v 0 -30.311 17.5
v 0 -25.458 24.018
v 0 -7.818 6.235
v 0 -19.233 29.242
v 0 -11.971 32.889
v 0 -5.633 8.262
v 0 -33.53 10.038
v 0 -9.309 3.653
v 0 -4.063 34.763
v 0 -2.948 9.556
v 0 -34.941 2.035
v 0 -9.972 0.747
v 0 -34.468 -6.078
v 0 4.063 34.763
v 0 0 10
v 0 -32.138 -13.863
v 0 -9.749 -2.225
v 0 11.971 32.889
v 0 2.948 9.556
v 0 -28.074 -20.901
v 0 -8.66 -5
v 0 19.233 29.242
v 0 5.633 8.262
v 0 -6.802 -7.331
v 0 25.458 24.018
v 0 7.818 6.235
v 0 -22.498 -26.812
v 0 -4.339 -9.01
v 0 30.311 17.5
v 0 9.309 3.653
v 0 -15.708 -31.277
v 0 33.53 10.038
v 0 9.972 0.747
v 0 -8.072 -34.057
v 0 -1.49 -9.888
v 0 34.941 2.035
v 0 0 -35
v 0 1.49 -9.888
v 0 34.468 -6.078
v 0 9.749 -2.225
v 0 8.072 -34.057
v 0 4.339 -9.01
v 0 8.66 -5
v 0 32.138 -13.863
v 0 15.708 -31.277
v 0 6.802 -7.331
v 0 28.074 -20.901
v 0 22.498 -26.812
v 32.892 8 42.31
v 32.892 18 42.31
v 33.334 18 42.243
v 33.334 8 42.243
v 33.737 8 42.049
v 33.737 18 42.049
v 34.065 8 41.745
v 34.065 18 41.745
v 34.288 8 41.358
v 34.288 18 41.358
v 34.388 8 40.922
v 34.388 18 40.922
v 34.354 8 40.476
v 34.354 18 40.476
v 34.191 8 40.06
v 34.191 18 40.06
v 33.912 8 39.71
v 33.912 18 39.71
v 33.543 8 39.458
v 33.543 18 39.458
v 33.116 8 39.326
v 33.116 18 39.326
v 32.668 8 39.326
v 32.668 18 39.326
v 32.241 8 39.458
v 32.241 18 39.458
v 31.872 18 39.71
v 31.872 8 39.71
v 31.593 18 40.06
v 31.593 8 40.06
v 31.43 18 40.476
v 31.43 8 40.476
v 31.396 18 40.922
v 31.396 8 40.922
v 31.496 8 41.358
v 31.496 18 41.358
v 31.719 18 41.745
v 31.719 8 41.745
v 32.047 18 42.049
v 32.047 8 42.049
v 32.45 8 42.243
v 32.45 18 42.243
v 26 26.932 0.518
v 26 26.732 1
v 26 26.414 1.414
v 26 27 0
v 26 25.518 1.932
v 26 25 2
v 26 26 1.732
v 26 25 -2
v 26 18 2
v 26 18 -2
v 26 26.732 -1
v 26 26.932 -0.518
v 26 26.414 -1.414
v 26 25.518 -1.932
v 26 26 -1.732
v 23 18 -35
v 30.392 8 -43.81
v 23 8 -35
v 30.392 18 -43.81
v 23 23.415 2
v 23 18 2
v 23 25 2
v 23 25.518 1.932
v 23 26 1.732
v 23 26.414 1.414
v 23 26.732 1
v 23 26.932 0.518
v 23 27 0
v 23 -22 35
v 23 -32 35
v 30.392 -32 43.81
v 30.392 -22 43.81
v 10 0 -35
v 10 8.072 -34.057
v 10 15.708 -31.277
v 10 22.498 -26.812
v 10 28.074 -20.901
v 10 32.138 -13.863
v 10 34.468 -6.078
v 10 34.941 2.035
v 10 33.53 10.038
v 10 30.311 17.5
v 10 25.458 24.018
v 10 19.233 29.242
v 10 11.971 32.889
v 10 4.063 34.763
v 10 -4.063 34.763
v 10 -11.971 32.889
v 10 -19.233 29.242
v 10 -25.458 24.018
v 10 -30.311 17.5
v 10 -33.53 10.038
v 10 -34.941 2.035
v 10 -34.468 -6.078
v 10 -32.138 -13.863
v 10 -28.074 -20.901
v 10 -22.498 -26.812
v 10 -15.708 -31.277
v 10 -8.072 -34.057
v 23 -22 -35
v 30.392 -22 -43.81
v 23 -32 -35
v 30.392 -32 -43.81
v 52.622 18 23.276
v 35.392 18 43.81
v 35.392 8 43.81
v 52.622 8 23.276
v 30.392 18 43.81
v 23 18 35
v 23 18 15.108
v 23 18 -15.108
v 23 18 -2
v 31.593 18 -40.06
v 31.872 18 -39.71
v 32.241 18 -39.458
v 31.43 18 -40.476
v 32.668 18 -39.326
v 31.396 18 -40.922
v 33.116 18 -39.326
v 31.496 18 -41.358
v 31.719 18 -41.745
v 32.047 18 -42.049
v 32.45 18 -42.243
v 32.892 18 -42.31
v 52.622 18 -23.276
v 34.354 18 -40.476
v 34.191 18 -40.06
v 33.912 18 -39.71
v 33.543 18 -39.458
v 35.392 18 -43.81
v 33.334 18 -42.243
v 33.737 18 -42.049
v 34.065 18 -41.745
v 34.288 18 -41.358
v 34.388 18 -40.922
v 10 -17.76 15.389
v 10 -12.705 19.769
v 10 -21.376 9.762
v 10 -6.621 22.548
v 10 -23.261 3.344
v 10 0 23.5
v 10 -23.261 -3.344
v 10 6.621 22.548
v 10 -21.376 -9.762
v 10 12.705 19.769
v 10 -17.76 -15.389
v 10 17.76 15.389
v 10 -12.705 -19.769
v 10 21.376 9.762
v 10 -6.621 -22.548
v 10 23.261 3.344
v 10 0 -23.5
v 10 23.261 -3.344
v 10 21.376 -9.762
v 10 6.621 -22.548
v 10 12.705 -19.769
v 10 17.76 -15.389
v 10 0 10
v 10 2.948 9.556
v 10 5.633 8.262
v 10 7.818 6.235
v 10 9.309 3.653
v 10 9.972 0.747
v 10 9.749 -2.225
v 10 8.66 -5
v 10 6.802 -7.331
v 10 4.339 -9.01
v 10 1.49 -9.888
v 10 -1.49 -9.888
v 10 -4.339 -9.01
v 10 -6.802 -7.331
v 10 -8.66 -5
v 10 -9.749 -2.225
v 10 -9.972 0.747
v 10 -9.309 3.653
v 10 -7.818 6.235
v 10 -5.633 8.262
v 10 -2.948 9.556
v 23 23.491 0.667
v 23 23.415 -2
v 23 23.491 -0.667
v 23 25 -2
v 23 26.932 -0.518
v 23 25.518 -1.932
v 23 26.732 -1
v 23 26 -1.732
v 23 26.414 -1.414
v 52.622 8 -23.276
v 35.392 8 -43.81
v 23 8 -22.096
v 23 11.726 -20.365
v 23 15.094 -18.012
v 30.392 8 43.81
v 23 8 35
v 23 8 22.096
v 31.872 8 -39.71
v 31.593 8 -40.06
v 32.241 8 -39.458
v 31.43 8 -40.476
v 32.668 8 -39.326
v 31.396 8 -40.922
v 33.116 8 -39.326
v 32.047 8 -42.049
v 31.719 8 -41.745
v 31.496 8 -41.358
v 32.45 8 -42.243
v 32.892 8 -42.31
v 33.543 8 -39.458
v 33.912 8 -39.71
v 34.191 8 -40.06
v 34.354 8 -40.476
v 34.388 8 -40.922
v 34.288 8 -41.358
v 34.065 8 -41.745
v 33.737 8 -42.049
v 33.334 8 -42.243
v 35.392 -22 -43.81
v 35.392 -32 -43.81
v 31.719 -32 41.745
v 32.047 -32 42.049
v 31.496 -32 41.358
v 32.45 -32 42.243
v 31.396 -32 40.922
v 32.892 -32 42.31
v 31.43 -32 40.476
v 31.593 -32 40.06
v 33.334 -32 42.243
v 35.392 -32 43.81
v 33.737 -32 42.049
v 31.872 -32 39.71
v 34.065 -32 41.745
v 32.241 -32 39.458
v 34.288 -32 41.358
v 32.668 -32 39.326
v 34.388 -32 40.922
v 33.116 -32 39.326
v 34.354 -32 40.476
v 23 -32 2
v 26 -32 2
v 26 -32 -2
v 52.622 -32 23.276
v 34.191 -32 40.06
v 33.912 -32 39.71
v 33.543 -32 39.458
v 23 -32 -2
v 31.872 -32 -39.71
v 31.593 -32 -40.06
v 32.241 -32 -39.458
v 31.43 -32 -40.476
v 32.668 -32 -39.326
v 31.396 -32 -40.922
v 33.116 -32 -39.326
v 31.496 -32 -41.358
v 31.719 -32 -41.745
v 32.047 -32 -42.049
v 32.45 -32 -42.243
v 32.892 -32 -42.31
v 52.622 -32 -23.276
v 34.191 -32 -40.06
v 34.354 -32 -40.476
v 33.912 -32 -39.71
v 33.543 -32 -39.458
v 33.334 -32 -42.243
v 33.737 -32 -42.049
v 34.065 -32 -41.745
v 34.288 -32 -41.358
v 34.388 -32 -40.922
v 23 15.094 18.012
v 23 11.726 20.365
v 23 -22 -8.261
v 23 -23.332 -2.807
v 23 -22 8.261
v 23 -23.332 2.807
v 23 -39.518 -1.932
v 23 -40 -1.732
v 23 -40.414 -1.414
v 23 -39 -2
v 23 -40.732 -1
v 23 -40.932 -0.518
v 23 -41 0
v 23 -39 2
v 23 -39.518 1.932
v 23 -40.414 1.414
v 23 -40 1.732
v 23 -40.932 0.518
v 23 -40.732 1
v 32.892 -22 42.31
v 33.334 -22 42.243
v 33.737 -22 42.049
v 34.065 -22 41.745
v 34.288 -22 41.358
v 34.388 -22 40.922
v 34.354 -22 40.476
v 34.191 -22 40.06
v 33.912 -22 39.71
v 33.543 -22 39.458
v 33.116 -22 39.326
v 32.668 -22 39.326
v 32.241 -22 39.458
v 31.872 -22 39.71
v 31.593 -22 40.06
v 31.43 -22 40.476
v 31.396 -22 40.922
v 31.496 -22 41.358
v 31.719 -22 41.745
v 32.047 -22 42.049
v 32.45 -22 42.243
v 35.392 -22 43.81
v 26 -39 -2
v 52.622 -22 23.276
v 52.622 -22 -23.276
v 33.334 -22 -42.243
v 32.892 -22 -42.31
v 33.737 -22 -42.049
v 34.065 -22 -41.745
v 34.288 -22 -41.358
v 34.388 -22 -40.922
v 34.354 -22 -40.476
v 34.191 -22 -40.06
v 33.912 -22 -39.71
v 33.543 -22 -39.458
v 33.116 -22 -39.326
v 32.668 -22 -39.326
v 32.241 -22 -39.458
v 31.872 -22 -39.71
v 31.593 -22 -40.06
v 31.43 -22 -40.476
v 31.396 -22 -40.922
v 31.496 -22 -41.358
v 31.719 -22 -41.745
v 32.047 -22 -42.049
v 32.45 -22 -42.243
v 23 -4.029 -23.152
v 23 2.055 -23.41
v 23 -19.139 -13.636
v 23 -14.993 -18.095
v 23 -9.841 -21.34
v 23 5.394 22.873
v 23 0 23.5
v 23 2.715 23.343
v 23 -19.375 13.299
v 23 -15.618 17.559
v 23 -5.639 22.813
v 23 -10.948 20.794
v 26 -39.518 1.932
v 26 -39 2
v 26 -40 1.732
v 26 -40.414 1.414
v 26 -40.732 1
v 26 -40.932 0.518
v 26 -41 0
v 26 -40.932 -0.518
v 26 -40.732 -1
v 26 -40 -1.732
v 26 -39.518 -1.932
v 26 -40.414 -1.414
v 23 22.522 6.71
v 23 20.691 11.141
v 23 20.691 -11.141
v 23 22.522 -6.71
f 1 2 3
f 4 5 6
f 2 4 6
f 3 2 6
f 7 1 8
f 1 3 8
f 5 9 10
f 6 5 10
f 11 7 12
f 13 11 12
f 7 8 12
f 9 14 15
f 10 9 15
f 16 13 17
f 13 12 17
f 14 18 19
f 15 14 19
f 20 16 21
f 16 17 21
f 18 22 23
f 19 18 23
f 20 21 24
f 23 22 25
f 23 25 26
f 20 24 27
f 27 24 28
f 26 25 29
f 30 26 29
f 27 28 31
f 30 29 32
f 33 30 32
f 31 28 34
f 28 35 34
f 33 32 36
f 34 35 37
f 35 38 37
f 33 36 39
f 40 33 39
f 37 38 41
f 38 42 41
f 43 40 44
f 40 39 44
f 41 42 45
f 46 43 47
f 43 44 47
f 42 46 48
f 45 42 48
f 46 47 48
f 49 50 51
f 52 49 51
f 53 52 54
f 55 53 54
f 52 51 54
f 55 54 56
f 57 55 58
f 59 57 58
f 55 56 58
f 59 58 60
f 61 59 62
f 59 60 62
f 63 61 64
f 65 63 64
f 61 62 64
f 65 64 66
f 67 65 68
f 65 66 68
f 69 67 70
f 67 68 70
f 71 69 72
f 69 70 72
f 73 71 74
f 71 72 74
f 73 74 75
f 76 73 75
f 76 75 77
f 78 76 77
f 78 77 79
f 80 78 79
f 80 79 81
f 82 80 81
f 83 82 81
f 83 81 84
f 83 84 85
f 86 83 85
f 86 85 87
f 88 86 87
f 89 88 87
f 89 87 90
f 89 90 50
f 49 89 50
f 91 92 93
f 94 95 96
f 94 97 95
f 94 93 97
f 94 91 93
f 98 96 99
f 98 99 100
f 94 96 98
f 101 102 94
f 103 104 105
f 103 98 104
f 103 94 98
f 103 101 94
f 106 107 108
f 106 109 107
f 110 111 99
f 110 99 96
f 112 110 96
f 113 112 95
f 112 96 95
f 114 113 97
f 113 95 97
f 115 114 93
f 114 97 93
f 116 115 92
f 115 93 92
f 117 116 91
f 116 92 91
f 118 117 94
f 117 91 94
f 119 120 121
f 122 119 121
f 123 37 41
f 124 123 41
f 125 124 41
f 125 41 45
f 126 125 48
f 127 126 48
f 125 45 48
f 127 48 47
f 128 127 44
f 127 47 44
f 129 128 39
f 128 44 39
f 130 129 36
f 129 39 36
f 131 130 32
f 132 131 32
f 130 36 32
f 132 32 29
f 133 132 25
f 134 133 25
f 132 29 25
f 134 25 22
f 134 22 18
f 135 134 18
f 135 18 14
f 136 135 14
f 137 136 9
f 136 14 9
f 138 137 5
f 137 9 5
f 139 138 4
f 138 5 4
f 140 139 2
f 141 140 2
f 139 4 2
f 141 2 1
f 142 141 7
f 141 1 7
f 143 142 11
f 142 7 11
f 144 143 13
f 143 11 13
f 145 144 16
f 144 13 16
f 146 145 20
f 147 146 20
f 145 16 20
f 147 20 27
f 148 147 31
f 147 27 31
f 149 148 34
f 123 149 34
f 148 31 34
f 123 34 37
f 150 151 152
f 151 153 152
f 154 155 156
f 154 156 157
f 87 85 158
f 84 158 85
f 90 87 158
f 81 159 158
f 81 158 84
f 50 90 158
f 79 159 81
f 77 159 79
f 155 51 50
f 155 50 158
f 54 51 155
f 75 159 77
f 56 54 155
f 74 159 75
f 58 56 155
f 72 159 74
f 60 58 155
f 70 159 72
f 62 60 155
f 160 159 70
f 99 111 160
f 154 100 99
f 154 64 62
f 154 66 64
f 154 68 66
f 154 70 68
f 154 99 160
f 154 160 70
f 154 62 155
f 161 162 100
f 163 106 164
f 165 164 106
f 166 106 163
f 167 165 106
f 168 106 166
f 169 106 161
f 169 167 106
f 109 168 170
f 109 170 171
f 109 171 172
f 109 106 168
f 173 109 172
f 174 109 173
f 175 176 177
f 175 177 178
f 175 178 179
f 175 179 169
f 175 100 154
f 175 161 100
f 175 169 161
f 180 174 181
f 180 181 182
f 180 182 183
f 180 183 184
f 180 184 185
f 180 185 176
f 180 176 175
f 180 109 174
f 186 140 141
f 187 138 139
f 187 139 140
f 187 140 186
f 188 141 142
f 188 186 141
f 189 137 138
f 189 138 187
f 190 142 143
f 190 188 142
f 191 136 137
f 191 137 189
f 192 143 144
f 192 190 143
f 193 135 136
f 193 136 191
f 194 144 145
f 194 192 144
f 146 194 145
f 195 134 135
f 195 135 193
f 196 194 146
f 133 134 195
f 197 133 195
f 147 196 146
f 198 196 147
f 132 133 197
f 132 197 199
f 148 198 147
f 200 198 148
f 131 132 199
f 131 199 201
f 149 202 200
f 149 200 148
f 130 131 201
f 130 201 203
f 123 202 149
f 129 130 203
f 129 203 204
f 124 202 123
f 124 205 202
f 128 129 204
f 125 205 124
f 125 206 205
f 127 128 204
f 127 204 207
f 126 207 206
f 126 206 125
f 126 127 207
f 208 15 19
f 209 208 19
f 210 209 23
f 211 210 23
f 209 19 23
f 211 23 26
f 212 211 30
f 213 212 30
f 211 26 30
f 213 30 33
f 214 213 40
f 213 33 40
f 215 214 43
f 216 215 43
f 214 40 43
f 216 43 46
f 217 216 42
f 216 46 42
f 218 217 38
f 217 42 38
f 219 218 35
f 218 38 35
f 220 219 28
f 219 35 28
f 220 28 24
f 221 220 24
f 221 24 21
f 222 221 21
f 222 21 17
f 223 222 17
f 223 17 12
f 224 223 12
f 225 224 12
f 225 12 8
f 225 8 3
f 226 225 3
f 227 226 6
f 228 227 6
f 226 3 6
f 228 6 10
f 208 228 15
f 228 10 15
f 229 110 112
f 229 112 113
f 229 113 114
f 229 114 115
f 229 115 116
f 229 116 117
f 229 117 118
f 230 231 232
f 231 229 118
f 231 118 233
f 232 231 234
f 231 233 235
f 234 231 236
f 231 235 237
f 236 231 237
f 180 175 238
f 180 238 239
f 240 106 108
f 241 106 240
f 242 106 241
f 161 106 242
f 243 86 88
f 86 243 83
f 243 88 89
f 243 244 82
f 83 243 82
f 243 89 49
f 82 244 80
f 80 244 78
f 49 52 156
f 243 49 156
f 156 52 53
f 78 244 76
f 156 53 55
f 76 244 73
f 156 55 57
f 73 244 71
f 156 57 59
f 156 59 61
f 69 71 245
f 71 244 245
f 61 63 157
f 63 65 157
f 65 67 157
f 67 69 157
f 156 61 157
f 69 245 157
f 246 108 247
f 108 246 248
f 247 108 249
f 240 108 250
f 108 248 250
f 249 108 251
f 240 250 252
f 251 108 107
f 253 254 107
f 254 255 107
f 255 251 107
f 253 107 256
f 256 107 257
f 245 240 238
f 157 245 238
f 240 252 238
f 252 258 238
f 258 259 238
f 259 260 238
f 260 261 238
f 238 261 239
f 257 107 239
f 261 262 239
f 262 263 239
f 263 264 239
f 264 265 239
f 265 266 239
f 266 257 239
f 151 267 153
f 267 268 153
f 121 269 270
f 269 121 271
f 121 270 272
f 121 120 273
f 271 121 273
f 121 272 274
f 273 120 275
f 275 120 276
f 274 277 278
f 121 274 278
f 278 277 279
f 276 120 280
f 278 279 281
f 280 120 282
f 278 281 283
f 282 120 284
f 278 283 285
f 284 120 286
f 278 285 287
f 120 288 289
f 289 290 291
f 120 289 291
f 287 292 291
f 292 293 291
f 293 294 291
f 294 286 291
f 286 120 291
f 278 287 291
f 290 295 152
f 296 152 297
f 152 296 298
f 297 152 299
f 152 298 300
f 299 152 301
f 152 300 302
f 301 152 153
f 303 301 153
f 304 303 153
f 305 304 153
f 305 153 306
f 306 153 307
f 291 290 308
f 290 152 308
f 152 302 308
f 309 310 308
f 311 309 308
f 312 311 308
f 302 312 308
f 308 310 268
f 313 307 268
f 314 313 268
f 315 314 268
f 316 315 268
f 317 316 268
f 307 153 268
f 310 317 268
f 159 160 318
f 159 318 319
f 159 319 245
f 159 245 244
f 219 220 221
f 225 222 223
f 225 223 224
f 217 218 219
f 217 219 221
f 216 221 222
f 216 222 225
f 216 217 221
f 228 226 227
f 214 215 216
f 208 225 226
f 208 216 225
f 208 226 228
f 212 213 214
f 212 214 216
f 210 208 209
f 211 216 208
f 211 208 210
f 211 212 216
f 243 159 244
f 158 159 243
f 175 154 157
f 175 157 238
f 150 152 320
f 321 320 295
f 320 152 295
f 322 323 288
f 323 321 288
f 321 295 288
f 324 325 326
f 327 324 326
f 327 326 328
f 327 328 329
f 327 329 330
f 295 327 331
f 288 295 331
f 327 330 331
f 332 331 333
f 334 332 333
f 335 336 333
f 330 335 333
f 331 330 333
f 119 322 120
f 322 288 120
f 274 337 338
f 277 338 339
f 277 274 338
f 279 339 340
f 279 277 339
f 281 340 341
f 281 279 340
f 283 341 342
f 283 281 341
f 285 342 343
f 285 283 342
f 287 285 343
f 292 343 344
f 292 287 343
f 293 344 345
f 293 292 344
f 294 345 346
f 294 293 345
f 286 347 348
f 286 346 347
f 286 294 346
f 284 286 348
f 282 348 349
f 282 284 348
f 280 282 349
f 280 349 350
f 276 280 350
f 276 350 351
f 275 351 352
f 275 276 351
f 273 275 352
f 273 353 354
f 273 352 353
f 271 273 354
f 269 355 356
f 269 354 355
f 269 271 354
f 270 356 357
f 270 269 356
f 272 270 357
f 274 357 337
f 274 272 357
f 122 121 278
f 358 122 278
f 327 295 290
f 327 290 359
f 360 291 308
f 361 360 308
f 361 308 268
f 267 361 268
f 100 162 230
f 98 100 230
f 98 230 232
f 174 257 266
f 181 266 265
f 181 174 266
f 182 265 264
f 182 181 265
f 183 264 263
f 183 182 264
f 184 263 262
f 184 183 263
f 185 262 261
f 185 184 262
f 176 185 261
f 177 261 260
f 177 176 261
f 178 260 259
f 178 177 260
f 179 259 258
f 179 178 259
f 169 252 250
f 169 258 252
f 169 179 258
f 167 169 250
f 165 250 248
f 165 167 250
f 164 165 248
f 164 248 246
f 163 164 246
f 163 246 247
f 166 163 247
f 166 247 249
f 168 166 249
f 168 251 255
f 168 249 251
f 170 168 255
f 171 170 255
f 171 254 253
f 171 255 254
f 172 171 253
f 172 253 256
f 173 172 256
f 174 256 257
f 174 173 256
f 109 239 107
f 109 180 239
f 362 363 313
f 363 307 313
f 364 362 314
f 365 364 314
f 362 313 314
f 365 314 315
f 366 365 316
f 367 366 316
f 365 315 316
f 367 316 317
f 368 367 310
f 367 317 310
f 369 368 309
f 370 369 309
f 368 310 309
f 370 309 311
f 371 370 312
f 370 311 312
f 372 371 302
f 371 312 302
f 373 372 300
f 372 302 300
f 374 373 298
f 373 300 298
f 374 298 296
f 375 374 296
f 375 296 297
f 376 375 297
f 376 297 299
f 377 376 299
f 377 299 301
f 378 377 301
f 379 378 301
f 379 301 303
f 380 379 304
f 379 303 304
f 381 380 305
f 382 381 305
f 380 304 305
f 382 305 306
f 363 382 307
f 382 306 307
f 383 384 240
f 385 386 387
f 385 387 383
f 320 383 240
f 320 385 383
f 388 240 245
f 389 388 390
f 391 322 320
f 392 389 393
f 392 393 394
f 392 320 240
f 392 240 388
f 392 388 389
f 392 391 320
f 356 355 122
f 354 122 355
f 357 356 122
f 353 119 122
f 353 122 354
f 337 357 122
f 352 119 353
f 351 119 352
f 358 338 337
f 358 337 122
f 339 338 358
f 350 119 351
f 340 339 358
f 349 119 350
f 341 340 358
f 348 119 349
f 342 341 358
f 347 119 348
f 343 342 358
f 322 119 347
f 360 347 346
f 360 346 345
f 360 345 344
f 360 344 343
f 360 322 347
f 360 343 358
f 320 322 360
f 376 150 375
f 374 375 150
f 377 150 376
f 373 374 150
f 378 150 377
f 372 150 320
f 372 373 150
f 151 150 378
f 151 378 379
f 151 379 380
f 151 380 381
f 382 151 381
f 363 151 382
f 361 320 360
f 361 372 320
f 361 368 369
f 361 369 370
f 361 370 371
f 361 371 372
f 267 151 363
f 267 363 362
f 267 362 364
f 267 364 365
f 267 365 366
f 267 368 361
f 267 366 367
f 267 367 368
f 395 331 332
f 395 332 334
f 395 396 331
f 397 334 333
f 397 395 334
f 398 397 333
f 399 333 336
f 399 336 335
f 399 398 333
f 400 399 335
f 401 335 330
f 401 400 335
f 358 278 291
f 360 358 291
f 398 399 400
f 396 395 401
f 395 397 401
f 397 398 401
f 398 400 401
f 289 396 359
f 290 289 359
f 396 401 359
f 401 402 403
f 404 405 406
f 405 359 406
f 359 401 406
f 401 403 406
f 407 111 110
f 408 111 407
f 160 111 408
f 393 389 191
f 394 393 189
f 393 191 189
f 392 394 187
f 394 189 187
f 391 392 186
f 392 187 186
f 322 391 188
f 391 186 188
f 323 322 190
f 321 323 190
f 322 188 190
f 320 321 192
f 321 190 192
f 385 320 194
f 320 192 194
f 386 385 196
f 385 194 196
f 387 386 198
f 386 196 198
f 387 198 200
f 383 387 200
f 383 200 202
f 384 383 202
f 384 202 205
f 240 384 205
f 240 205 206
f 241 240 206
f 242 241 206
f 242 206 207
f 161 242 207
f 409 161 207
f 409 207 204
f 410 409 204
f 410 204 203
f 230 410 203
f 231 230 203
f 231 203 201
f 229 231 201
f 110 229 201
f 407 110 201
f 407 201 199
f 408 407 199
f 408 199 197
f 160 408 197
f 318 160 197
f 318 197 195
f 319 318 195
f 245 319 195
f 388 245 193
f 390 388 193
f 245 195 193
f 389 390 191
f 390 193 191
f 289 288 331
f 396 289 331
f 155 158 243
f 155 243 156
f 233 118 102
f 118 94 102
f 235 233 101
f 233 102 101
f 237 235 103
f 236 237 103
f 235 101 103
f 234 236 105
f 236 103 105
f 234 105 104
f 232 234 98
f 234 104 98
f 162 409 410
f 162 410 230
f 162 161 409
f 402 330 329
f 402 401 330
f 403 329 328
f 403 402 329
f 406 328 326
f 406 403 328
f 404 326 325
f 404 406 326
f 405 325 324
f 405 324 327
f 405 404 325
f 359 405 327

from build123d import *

# Parameters (mm, degrees)
SKETCH1_R               = 35
BOSS_EXTRUDE1_DEPTH     = 10
SKETCH2_R               = 23.5
BOSS_EXTRUDE2_DEPTH     = 13
BOSS_EXTRUDE3_DEPTH     = 5
SKETCH5_R               = 1.5
CUT_EXTRUDE1_DEPTH      = 87.587143002
SKETCH9_W               = 4
SKETCH9_H               = 9
BOSS_EXTRUDE8_DEPTH     = 3
FILLET3_R               = 2
SKETCH11_R              = 10
CUT_EXTRUDE2_DEPTH      = 10
MIRROR2_COPY_1_SKETCH_R = 1.5
MIRROR2_COPY_1_DEPTH    = 87.587143002
FILLET3_OF_MIRROR2_R    = 2


with BuildPart() as part:
    # Sketch1 → Boss-Extrude1 (new body)
    with BuildSketch(Plane(origin=(0, 0, 0), x_dir=(0, 0, -1), z_dir=(1, 0, 0))):
        Circle(SKETCH1_R)
    extrude(amount=BOSS_EXTRUDE1_DEPTH)

    # Sketch2 → Boss-Extrude2 (add)
    with BuildSketch(Plane(origin=(10, 0, 0), x_dir=(0, 0, -1), z_dir=(1, 0, 0))):
        with Locations(Location((0, 0, 0), (0, 0, 180))):
            Circle(SKETCH2_R)
    extrude(amount=BOSS_EXTRUDE2_DEPTH)

    # Sketch4 → Boss-Extrude3 (add, symmetric)
    with BuildSketch(Plane(origin=(0, 13, 0), x_dir=(1, 0, 0), z_dir=(0, 1, 0))):
        Polygon((23, 35), (23, -35), (30.392057511, -43.809511096), (35.392057511, -43.809511096), (52.621859248, -23.275832977), (52.621859248, 23.275832977), (35.392057511, 43.809511096), (30.392057511, 43.809511096), align=None)
    boss_extrude3 = extrude(amount=BOSS_EXTRUDE3_DEPTH, both=True)

    # Sketch5 → Cut-Extrude1 (cut, through all)
    with BuildSketch(Plane(origin=(0, 18, 0), x_dir=(1, 0, 0), z_dir=(0, 1, 0))):
        with Locations(Location((32.892057511, -40.809511096, 0), (0, 0, 270))):
            Circle(SKETCH5_R)
    cut_extrude1 = extrude(amount=-CUT_EXTRUDE1_DEPTH, mode=Mode.SUBTRACT)

    # Mirror1: Cut-Extrude1 across plane
    add(cut_extrude1.mirror(Plane.XY), mode=Mode.SUBTRACT)

    # Sketch9 → Boss-Extrude8 (add)
    with BuildSketch(Plane(origin=(23, 0, 0), x_dir=(0, 0, -1), z_dir=(1, 0, 0))):
        with Locations((0, 22.5)):
            Rectangle(SKETCH9_W, SKETCH9_H)
    boss_extrude8 = extrude(amount=BOSS_EXTRUDE8_DEPTH)

    # Fillet3
    fillet3_edges = [part.edges().sort_by_distance(p)[0] for p in [
        (24.5, 27, -2),
        (24.5, 27, 2),
    ]]
    fillet(fillet3_edges, radius=FILLET3_R - 0.0001)  # a hair under: the kernel refuses the full size

    # Sketch11 → Cut-Extrude2 (cut)
    with BuildSketch(Plane.ZY):
        Circle(SKETCH11_R)
    extrude(amount=-CUT_EXTRUDE2_DEPTH, mode=Mode.SUBTRACT)

    # Mirror2: Boss-Extrude3, Cut-Extrude1, Boss-Extrude8 across plane
    add(boss_extrude3.mirror(Plane(origin=(0, -7, 0), x_dir=(0, 0, 1), z_dir=(0, -1, 0))))
    add(cut_extrude1.mirror(Plane(origin=(0, -7, 0), x_dir=(0, 0, 1), z_dir=(0, -1, 0))), mode=Mode.SUBTRACT)
    add(boss_extrude8.mirror(Plane(origin=(0, -7, 0), x_dir=(0, 0, 1), z_dir=(0, -1, 0))))

    # Mirror2 copy 1 sketch → Mirror2 copy 1 (cut, through all)
    with BuildSketch(Plane.XZ.offset(32)):
        with Locations(Location((32.892057511, -40.809511096, 0), (0, 0, 270))):
            Circle(MIRROR2_COPY_1_SKETCH_R)
    extrude(amount=-MIRROR2_COPY_1_DEPTH, mode=Mode.SUBTRACT)

    # Fillet3 of Mirror2
    fillet3_of_mirror2_edges = [part.edges().sort_by_distance(p)[0] for p in [
        (24.5, -41, -2),
        (24.5, -41, 2),
    ]]
    fillet(fillet3_of_mirror2_edges, radius=FILLET3_OF_MIRROR2_R - 0.0001)  # a hair under: the kernel refuses the full size


solid = part.part
